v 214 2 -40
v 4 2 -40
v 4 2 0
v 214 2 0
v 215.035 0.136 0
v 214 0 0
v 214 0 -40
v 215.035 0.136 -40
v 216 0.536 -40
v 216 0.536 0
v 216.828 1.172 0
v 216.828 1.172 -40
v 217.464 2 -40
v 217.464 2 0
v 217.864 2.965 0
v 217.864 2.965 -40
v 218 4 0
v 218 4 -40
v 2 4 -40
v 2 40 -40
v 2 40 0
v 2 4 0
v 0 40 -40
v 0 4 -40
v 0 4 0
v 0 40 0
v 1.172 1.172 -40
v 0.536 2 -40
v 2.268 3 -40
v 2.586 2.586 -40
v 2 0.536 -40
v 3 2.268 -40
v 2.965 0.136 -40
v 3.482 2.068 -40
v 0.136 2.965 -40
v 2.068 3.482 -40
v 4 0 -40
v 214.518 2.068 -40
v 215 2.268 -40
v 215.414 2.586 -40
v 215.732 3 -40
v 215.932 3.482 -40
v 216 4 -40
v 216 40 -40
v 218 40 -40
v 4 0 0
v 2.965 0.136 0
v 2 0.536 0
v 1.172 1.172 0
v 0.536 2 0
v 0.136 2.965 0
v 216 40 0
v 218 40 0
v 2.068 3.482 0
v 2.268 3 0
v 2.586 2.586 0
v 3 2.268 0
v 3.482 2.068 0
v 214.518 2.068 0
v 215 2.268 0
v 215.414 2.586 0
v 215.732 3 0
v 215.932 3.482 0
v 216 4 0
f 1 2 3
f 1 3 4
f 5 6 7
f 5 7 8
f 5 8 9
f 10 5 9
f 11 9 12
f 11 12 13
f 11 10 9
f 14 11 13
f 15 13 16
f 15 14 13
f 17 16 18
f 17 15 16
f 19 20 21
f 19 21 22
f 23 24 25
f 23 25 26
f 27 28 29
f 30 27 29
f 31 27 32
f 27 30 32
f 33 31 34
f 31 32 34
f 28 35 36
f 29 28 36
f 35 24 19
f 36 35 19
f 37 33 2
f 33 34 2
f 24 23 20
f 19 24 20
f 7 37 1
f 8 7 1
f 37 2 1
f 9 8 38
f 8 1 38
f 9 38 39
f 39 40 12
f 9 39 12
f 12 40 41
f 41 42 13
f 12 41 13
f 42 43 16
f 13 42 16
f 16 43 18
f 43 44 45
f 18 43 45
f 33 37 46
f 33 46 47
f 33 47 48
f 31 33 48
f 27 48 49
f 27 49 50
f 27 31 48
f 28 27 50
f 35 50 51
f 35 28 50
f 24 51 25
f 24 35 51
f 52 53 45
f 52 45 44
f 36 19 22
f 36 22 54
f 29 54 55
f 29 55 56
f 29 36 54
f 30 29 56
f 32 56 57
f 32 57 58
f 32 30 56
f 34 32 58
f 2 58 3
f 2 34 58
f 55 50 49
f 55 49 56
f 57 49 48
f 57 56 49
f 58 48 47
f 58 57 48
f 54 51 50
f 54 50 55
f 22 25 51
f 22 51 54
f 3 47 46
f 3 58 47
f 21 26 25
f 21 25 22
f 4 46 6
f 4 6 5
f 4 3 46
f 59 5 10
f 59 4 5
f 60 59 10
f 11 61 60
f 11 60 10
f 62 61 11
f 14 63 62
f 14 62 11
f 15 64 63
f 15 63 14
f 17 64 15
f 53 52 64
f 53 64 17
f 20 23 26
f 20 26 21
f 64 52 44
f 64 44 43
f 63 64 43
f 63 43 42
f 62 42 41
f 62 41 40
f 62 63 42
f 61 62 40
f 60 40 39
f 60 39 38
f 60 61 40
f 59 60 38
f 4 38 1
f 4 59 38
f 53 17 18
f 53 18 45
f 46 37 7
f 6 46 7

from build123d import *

# Parameters (mm, degrees)
SKETCH_1_W                       = 218
SKETCH_1_H                       = 40
EXTRUDE_1_DEPTH                  = 2
SM_EDGE_FLANGE_1_STRIP_W         = 12
SM_EDGE_FLANGE_1_STRIP_H         = 2
SM_EDGE_FLANGE_1_STRIP_CUT_DEPTH = 40
SM_EDGE_FLANGE_1_DEPTH           = 40
SM_EDGE_FLANGE_2_STRIP_W         = 12
SM_EDGE_FLANGE_2_STRIP_H         = 2
SM_EDGE_FLANGE_2_STRIP_CUT_DEPTH = 40
SM_EDGE_FLANGE_2_DEPTH           = 40


# Sheet-metal steps are written as plain solids
with BuildPart() as part:
    # Sketch 1 → Бобышка-Вытянуть1 (new body)
    with BuildSketch(Plane(origin=(0, 0, 0), x_dir=(1, 0, 0), z_dir=(0, 1, 0))):
        with Locations((109, 20)):
            Rectangle(SKETCH_1_W, SKETCH_1_H)
    extrude(amount=EXTRUDE_1_DEPTH)

    # Ребро-кромка1 strip (across the edge) → Ребро-кромка1 strip cut (cut)
    with BuildSketch(Plane(origin=(0, 2, -40), x_dir=(1, 0, 0), z_dir=(0, 0, 1))):
        with Locations((-2, -1)):
            Rectangle(SM_EDGE_FLANGE_1_STRIP_W, SM_EDGE_FLANGE_1_STRIP_H)
    extrude(amount=SM_EDGE_FLANGE_1_STRIP_CUT_DEPTH, mode=Mode.SUBTRACT)

    # Ребро-кромка1 section (across the edge) → Ребро-кромка1 (add)
    with BuildSketch(Plane(origin=(0, 2, -40), x_dir=(1, 0, 0), z_dir=(0, 0, 1))):
        with BuildLine():
            Line((0, 2), (0, 38))
            Line((0, 38), (2, 38))
            Line((2, 38), (2, 2))
            ThreePointArc((2, 2), (2.585786438, 0.585786438), (4, 0))
            Line((4, 0), (4, -2))
            ThreePointArc((4, -2), (1.171572875, -0.828427125), (0, 2))
        make_face()
    extrude(amount=SM_EDGE_FLANGE_1_DEPTH)

    # Ребро-кромка2 strip (across the edge) → Ребро-кромка2 strip cut (cut)
    with BuildSketch(Plane(origin=(218, 2, 0), x_dir=(-1, 0, 0), z_dir=(0, 0, -1))):
        with Locations((-2, -1)):
            Rectangle(SM_EDGE_FLANGE_2_STRIP_W, SM_EDGE_FLANGE_2_STRIP_H)
    extrude(amount=SM_EDGE_FLANGE_2_STRIP_CUT_DEPTH, mode=Mode.SUBTRACT)

    # Ребро-кромка2 section (across the edge) → Ребро-кромка2 (add)
    with BuildSketch(Plane(origin=(218, 2, 0), x_dir=(-1, 0, 0), z_dir=(0, 0, -1))):
        with BuildLine():
            Line((0, 2), (0, 38))
            Line((0, 38), (2, 38))
            Line((2, 38), (2, 2))
            ThreePointArc((2, 2), (2.585786438, 0.585786438), (4, 0))
            Line((4, 0), (4, -2))
            ThreePointArc((4, -2), (1.171572875, -0.828427125), (0, 2))
        make_face()
    extrude(amount=SM_EDGE_FLANGE_2_DEPTH)


solid = part.part
